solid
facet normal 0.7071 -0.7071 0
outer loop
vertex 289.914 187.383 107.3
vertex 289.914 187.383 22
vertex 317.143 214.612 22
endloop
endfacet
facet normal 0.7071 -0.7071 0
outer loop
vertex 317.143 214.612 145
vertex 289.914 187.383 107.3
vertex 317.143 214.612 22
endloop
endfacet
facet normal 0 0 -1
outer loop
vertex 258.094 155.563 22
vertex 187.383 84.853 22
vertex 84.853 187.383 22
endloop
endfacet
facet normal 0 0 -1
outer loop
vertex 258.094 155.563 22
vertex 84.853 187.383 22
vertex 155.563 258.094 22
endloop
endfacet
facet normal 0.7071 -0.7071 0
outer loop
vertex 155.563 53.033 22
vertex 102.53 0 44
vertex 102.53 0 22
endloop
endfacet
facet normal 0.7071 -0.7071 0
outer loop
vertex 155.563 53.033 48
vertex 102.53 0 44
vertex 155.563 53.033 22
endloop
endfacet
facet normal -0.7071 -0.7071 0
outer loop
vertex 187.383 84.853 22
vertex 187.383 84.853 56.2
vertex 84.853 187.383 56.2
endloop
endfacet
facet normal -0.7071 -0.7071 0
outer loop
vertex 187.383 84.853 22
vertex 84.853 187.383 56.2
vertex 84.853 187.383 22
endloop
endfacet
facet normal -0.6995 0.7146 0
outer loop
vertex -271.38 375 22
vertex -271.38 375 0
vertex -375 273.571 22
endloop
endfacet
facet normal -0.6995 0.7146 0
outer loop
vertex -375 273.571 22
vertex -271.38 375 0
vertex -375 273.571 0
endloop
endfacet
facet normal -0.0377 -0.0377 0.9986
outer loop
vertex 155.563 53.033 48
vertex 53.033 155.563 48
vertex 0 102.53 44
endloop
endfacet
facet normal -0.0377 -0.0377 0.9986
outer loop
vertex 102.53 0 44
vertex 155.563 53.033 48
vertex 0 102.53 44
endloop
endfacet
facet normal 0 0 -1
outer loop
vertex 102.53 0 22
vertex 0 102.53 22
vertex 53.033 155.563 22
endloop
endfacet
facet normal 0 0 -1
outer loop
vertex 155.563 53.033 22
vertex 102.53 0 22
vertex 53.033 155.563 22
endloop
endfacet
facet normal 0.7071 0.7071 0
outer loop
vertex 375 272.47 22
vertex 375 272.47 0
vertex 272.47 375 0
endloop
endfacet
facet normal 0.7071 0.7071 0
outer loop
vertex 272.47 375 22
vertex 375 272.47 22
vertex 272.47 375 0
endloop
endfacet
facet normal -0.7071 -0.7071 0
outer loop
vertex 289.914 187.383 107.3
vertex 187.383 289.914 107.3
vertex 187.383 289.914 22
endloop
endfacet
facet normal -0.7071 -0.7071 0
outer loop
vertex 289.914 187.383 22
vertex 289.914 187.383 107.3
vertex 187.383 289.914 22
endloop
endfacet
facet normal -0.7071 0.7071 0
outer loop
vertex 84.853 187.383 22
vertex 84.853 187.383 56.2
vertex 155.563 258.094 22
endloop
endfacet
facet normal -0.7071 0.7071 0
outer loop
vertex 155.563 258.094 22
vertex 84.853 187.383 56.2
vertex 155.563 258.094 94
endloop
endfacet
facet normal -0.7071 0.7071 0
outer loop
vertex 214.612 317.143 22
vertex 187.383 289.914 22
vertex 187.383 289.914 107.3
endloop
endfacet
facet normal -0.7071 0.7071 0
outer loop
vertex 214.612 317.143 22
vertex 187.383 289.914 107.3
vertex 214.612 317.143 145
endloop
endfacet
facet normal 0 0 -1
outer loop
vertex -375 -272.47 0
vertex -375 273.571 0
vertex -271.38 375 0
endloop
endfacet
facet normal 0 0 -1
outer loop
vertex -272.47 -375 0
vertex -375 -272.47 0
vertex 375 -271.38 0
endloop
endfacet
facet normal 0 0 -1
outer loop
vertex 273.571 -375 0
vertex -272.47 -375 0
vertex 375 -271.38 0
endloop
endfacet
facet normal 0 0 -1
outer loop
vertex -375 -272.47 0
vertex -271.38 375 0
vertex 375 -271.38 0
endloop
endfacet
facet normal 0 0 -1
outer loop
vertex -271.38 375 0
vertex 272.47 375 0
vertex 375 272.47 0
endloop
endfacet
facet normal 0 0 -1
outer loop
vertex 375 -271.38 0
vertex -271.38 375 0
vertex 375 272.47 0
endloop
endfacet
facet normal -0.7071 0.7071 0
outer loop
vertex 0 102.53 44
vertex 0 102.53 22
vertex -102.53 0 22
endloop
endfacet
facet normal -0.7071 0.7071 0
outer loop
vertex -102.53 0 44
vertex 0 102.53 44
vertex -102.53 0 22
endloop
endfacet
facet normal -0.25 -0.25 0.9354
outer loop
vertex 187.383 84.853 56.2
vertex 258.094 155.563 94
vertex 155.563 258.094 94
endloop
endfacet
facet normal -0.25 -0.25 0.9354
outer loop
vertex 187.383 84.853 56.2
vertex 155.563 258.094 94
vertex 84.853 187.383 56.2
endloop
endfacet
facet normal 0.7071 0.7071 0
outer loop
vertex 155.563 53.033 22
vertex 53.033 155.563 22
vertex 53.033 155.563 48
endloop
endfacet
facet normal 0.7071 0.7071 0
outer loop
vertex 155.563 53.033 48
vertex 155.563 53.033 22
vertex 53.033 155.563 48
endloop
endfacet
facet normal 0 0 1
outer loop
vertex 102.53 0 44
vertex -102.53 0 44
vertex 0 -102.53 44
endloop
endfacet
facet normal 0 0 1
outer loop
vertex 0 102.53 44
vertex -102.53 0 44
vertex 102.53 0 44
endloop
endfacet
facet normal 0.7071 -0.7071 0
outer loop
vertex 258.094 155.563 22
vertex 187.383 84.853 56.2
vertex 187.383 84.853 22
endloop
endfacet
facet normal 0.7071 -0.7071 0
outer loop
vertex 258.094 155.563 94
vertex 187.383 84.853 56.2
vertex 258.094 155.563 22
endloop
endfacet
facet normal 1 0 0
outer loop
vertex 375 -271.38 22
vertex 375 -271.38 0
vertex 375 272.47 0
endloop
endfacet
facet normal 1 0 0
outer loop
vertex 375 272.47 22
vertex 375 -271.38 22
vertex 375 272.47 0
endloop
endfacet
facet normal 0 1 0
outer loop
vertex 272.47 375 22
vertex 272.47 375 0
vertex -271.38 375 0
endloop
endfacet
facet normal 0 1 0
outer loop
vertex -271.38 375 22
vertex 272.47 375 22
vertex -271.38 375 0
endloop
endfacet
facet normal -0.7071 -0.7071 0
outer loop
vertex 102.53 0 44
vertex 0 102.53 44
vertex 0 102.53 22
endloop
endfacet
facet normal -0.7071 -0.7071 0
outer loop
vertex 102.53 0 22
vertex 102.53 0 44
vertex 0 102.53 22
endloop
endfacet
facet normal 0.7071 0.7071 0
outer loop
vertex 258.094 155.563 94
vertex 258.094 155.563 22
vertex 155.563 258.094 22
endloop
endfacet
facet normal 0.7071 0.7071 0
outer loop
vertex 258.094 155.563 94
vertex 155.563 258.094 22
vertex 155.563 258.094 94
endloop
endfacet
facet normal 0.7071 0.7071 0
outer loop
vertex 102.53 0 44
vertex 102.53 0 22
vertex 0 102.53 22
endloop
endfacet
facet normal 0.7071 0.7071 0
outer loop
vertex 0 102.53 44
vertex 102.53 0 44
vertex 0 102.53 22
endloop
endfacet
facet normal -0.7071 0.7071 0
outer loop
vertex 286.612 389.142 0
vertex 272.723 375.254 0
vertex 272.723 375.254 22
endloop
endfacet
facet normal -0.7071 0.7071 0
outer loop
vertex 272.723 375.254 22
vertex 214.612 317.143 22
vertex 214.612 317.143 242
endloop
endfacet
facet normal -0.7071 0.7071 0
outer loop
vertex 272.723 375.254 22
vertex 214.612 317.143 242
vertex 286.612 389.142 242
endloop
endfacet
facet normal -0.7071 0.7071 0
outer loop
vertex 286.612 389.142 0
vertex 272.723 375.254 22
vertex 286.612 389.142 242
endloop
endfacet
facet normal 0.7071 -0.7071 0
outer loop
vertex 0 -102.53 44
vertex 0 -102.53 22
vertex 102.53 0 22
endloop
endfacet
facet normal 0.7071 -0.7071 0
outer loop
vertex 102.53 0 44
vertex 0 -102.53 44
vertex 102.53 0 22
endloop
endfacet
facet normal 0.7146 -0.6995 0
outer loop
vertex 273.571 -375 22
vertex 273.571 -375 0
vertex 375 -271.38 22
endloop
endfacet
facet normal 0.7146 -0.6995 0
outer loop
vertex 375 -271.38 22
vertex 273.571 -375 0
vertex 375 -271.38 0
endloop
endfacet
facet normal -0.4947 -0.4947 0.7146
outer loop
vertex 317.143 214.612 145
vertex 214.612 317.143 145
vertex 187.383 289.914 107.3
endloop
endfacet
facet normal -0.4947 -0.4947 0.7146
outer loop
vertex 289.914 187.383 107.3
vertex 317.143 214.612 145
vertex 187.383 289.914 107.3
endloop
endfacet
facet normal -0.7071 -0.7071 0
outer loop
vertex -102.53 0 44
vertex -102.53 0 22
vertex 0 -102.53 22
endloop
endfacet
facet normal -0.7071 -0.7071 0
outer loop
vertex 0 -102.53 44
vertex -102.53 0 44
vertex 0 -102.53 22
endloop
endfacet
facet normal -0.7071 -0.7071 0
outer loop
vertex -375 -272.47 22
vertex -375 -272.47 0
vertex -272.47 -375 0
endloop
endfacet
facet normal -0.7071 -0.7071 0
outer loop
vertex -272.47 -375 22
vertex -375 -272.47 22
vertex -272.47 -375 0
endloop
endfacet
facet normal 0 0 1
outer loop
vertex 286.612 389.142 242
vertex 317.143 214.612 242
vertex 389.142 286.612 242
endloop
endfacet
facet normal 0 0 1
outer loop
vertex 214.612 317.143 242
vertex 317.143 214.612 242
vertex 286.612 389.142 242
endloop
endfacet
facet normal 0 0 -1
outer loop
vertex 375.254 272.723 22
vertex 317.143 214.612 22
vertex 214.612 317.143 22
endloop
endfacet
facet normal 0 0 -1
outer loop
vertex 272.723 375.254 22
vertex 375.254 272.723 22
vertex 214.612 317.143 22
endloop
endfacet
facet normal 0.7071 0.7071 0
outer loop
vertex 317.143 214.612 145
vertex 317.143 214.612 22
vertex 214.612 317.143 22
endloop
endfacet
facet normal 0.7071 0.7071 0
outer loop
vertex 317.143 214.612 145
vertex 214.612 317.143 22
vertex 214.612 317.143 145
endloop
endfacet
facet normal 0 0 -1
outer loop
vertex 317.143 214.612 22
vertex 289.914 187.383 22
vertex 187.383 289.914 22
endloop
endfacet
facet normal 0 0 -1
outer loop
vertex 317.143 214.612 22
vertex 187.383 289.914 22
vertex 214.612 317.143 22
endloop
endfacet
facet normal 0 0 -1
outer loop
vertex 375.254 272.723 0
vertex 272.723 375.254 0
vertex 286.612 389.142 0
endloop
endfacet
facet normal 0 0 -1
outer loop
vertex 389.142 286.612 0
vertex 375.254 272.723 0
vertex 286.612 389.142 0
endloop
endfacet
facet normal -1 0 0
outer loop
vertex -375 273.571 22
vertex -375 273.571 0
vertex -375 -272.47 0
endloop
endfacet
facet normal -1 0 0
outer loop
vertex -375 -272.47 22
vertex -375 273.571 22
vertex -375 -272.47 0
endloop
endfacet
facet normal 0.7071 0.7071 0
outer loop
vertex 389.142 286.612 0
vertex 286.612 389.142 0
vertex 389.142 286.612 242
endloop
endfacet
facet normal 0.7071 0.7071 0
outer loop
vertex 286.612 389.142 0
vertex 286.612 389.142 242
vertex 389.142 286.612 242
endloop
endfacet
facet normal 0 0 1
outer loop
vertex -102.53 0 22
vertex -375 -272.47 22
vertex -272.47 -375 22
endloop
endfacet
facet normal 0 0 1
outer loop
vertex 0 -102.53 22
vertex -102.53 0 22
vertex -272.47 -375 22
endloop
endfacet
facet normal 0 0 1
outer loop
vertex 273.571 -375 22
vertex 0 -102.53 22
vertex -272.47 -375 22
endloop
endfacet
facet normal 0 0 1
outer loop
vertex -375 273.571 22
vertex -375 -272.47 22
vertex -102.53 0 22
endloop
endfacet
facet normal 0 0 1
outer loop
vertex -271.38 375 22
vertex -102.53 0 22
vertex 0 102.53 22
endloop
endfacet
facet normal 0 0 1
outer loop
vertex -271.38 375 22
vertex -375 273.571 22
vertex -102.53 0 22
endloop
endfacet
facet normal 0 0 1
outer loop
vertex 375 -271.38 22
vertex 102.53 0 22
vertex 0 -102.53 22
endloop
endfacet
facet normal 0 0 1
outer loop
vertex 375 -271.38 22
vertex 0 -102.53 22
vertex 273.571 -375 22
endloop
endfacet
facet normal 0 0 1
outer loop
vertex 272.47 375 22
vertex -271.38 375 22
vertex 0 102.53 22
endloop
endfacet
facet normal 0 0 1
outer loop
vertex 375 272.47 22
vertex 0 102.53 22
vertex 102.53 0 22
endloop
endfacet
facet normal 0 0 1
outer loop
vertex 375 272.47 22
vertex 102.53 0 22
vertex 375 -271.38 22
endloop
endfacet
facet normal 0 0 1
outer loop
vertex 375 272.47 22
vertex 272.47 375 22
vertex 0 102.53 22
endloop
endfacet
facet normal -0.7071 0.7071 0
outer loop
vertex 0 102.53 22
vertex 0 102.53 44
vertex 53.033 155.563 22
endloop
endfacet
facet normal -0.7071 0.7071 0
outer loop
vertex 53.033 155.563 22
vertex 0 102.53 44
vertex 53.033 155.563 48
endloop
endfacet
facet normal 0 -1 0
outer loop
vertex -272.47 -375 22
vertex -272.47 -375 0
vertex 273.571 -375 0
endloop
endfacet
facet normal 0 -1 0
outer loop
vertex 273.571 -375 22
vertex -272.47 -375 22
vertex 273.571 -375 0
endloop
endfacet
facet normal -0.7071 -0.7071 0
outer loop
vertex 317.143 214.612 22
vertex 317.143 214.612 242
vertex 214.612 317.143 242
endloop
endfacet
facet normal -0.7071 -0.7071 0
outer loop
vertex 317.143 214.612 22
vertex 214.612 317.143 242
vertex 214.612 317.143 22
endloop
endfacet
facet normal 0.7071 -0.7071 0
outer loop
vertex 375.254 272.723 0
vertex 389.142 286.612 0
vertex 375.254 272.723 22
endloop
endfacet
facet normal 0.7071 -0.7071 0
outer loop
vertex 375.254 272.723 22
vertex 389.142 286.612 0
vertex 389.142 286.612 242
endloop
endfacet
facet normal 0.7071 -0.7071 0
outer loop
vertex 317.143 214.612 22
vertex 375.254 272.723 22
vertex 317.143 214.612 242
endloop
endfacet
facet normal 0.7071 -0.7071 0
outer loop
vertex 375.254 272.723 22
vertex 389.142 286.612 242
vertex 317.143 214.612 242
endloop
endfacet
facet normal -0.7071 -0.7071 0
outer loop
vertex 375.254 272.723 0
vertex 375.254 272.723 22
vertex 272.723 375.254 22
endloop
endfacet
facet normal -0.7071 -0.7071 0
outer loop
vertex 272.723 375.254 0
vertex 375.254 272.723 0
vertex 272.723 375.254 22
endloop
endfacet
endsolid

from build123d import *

# Parameters (mm, degrees)
F1_DEPTH  = 22
F3_DEPTH  = 22
F5_DEPTH  = 145
F6_DEPTH  = 145
F7_DEPTH  = 145
F8_DEPTH  = 145
F9_DEPTH  = 20
F11_DEPTH = 22


with BuildPart() as f1:
    # F0 (on Top) → F1 (new body)
    with BuildSketch(Plane.XY):
        Polygon((272.469516728, 375), (-271.380000358, 375), (-375, 273.5707356125), (-375, -272.469516728), (-272.469516728, -375), (273.5707356125, -375), (375, -271.380000358), (375, 272.469516728), align=None)
    extrude(amount=F1_DEPTH)

    # F2 (on face) → F3 (join)
    with BuildSketch(Plane.XY.offset(22)):
        Polygon((102.530483272, 0), (0, 102.5304832721), (-102.530483272, 0), (0, -102.530483272), align=None)
    extrude(amount=F3_DEPTH)


with BuildPart() as f5:
    # F4 (on face) → F5 (new body)
    with BuildSketch(Plane(origin=(51.265241636, -51.265241636, 0), x_dir=(0.7071067812, 0.7071067812, 0), z_dir=(0.7071067812, -0.7071067812, 0))):
        Polygon((72.5, 44), (72.5, 22), (147.5, 22), (147.5, 48), align=None)
    extrude(amount=-F5_DEPTH)


with BuildPart() as f6:
    # F4 (on face) → F6 (new body)
    with BuildSketch(Plane(origin=(51.265241636, -51.265241636, 0), x_dir=(0.7071067812, 0.7071067812, 0), z_dir=(0.7071067812, -0.7071067812, 0))):
        Polygon((192.5, 56.2), (192.5, 22), (292.5, 22), (292.5, 94), align=None)
    extrude(amount=-F6_DEPTH)


with BuildPart() as f7:
    # F4 (on face) → F7 (new body)
    with BuildSketch(Plane(origin=(51.265241636, -51.265241636, 0), x_dir=(0.7071067812, 0.7071067812, 0), z_dir=(0.7071067812, -0.7071067812, 0))):
        Polygon((337.5, 107.3), (337.5, 22), (376.0077297688, 22), (376.0077297688, 145), align=None)
    extrude(amount=-F7_DEPTH)


with BuildPart() as f8:
    # F4 (on face) → F8 (new body)
    with BuildSketch(Plane(origin=(51.265241636, -51.265241636, 0), x_dir=(0.7071067812, 0.7071067812, 0), z_dir=(0.7071067812, -0.7071067812, 0))):
        Polygon((376.0077297688, 145), (376.0077297688, 22), (457.8300858899, 22), (457.8300858899, 242), (376.0077297688, 242), align=None)
    extrude(amount=-F8_DEPTH)

    # F9 (add): a face of the model
    f9_faces = [f8.faces().sort_by_distance(p)[0] for p in [
        (323.734758364, 323.734758364, 132),
    ]]
    extrude(f9_faces, amount=F9_DEPTH)

    # F10 (on face) → F11 (join)
    with BuildSketch(Plane(origin=(0, 0, 22), x_dir=(1, 0, 0), z_dir=(0, 0, -1))):
        Polygon((272.7231215108, -375.2536047828), (286.6116523517, -389.1421356237), (389.1421356237, -286.6116523517), (375.2536047828, -272.7231215108), align=None)
    extrude(amount=F11_DEPTH)


solid = Compound([f1.part, f5.part, f6.part, f7.part, f8.part])
